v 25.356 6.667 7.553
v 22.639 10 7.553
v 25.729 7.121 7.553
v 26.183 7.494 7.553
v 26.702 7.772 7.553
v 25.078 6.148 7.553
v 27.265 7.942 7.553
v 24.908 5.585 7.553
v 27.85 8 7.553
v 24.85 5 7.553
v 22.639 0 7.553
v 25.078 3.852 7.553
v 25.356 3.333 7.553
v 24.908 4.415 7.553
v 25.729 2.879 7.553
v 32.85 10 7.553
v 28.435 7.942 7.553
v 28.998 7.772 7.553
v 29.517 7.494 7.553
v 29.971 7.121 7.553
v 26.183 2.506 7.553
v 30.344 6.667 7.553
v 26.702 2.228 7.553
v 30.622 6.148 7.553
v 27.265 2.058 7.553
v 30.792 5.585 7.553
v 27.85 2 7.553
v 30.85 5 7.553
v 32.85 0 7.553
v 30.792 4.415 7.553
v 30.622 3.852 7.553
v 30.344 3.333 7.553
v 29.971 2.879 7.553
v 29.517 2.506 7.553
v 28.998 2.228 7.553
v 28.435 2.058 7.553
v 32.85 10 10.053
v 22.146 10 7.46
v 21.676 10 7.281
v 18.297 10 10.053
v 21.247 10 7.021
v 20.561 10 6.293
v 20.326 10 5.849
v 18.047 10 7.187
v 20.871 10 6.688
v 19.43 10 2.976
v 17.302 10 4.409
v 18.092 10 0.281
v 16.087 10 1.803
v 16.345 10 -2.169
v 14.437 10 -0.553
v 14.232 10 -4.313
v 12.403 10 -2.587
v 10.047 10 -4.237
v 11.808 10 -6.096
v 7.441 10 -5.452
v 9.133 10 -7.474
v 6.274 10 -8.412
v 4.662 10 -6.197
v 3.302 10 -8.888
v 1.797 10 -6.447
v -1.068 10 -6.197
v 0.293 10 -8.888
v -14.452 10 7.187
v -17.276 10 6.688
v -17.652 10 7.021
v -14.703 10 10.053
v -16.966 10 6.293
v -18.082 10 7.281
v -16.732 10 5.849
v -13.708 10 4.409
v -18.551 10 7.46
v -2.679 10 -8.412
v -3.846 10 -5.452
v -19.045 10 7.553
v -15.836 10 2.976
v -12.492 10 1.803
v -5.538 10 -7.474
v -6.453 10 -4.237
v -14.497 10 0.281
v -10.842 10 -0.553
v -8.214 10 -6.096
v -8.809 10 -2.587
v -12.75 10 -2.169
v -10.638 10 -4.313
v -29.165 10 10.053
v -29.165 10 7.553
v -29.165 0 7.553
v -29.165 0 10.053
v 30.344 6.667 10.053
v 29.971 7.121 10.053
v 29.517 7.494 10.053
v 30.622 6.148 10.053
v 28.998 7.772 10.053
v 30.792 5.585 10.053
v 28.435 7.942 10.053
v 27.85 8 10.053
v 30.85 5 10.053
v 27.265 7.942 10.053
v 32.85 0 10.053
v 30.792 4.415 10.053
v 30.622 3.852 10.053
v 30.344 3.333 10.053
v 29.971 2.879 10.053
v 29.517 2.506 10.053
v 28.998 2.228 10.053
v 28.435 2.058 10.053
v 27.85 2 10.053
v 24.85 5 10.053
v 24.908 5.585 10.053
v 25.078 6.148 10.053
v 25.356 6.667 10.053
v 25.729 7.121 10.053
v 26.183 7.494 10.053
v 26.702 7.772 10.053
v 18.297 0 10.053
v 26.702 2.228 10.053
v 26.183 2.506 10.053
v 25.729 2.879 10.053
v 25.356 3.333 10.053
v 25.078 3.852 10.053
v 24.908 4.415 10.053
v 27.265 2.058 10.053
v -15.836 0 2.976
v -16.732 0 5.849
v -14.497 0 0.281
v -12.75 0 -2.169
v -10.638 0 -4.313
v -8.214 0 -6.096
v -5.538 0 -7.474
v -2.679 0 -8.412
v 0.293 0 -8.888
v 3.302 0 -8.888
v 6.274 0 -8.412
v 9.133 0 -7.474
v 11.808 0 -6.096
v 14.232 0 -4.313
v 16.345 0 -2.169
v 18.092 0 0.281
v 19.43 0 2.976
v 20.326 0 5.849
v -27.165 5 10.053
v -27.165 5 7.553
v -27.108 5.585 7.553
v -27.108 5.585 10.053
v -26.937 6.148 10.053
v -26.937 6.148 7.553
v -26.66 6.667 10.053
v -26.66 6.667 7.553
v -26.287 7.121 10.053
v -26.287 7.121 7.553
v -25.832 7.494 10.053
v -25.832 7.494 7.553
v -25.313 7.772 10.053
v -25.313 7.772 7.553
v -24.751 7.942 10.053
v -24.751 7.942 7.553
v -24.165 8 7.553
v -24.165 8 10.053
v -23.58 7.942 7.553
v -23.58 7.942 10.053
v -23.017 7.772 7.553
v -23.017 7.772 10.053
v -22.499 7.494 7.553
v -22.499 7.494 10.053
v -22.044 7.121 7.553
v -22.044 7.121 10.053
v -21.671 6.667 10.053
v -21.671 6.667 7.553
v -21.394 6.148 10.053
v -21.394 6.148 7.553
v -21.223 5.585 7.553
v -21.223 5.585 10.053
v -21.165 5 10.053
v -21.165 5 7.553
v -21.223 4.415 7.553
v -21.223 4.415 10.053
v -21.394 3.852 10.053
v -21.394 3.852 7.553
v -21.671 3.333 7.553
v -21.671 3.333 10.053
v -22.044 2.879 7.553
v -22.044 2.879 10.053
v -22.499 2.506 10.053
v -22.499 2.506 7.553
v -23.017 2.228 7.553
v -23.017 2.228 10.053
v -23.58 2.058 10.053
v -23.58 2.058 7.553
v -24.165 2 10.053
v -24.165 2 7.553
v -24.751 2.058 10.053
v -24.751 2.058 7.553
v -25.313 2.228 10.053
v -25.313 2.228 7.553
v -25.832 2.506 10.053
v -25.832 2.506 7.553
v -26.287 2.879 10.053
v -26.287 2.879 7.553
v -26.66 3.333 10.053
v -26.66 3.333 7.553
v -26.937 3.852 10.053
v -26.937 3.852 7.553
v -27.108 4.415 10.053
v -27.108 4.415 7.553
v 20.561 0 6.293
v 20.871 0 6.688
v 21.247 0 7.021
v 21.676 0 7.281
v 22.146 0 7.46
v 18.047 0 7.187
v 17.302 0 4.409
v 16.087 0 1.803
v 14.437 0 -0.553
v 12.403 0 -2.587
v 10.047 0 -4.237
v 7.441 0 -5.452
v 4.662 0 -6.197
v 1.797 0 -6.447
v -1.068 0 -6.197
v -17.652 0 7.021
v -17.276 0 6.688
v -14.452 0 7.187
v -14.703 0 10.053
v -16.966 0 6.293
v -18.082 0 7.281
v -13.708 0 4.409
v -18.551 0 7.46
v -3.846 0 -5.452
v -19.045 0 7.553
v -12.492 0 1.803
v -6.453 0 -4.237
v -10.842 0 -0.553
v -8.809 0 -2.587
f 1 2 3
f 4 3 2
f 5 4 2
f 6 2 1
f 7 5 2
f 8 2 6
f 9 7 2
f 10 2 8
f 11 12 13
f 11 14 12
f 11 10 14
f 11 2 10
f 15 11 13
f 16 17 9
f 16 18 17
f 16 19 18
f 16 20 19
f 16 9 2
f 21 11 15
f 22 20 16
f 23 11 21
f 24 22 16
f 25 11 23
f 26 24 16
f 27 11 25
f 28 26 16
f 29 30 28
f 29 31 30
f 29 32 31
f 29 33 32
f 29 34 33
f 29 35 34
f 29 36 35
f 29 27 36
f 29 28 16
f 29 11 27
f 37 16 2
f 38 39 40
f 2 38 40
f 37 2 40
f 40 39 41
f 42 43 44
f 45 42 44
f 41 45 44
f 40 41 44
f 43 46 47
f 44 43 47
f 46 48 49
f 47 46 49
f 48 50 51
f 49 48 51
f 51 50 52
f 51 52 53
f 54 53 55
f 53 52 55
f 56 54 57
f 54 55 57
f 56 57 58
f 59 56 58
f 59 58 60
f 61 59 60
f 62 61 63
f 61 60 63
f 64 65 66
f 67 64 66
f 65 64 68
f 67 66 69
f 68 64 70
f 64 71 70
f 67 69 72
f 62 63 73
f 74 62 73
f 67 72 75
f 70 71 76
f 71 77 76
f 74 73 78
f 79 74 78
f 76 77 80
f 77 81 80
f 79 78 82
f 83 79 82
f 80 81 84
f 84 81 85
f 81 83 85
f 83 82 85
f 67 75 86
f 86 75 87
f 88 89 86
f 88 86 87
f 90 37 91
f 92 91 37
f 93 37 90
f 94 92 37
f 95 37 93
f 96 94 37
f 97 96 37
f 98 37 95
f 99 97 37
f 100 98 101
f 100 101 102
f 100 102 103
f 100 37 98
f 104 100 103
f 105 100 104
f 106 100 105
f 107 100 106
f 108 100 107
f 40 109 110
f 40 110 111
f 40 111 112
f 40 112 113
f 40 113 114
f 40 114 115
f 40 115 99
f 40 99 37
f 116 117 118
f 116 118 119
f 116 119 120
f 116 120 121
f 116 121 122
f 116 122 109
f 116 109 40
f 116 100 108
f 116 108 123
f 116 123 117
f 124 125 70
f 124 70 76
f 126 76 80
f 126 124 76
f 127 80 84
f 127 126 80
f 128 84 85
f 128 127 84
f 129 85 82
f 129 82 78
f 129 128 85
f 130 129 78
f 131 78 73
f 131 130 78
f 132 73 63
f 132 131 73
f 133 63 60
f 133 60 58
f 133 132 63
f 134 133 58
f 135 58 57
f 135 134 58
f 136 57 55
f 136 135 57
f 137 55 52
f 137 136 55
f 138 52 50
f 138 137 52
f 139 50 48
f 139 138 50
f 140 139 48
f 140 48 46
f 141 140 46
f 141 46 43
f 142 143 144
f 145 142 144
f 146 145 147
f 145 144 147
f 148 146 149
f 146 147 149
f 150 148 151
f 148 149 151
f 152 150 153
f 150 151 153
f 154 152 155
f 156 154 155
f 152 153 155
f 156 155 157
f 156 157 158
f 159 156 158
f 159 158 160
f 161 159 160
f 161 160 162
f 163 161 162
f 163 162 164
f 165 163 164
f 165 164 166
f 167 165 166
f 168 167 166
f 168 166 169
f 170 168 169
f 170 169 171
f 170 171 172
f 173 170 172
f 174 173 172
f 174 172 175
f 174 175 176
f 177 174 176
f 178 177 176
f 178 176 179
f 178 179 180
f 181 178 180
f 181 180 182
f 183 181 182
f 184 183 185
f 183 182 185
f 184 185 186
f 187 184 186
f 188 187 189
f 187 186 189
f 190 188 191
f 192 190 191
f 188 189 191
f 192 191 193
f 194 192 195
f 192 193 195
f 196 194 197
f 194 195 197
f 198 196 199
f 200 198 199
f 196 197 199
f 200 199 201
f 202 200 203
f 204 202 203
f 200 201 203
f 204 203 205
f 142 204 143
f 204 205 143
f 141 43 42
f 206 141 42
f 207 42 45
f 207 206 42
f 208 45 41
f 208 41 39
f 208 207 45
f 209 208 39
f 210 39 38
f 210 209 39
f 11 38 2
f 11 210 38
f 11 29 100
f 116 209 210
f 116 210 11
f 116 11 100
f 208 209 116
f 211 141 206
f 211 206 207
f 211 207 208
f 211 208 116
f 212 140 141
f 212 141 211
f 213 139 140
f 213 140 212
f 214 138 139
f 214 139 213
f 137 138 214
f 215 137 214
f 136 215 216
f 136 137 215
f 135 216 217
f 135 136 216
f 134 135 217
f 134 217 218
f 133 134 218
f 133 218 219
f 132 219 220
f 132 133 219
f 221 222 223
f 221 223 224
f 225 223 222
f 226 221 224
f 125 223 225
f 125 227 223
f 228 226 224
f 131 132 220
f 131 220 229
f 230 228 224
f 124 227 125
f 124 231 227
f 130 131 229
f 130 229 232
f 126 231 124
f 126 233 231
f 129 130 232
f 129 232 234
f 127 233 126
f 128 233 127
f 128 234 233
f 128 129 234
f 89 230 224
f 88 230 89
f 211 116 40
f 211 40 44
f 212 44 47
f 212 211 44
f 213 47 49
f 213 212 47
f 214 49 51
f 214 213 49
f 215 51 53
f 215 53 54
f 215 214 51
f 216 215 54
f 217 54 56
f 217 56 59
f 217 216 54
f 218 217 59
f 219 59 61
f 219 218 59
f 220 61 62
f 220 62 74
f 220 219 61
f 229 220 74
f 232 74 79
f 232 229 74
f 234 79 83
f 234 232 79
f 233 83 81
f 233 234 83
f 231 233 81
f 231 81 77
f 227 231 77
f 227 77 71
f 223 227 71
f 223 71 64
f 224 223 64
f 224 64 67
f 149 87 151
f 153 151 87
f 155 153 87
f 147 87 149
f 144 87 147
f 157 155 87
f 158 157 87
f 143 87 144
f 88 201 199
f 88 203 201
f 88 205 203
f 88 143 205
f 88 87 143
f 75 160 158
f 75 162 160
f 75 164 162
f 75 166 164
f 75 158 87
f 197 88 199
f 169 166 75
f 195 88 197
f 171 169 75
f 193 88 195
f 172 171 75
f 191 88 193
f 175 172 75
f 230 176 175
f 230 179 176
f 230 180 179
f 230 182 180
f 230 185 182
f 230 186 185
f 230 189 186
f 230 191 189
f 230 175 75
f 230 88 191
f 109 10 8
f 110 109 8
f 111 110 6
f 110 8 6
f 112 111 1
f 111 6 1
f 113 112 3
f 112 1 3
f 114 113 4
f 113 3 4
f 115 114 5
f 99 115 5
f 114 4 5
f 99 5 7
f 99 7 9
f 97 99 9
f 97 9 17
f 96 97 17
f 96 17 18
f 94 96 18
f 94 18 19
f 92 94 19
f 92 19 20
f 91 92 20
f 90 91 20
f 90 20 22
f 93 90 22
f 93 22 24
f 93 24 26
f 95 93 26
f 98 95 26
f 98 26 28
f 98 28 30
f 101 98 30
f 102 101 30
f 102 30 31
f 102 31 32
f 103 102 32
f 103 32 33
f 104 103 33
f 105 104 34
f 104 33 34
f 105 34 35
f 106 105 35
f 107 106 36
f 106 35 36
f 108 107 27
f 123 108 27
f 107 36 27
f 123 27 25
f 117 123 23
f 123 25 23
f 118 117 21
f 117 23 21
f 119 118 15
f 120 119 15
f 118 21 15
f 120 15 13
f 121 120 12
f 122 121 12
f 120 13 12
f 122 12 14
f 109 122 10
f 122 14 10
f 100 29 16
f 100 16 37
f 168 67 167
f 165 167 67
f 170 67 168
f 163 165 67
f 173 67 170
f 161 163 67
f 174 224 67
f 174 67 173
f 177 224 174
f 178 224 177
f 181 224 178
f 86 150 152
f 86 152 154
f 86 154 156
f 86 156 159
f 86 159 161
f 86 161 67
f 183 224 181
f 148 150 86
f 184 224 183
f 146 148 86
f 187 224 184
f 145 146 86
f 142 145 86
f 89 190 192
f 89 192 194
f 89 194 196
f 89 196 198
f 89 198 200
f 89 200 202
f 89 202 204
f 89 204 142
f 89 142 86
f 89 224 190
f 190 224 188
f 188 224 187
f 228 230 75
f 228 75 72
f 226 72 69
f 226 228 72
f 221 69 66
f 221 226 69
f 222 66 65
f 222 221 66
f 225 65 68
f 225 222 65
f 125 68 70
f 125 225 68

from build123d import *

# Parameters (mm, degrees)
BOSS_EXTRUDE1_DEPTH = 10
SKETCH2_R           = 3
CUT_EXTRUDE1_DEPTH  = 8


with BuildPart() as part:
    # Sketch1 → Boss-Extrude1 (new body)
    with BuildSketch(Plane(origin=(0, 0, 0), x_dir=(1, 0, 0), z_dir=(0, 1, 0))):
        with BuildLine():
            Line((-14.70271565, -10.052675371), (-29.165444207, -10.052675371))
            Line((-29.165444207, -10.052675371), (-29.165444207, -7.552675371))
            Line((-29.165444207, -7.552675371), (-19.04460375, -7.552675371))
            ThreePointArc((-19.04460375, -7.552675371), (-17.652378747, -7.021091902), (-16.731881464, -5.849103764))
            ThreePointArc((-16.731881464, -5.849103764), (1.79728435, 8.947324629), (20.326450163, -5.849103764))
            ThreePointArc((20.326450163, -5.849103764), (21.246947447, -7.021091902), (22.63917245, -7.552675371))
            Line((22.63917245, -7.552675371), (32.849946683, -7.552675371))
            Line((32.849946683, -7.552675371), (32.849946683, -10.052675371))
            Line((32.849946683, -10.052675371), (18.29728435, -10.052675371))
            ThreePointArc((18.29728435, -10.052675371), (1.79728435, 6.447324629), (-14.70271565, -10.052675371))
        make_face()
    extrude(amount=BOSS_EXTRUDE1_DEPTH)

    # Sketch2 → Cut-Extrude1 (cut)
    with BuildSketch(Plane(origin=(0, 0, 7.552675371), x_dir=(-1, 0, 0), z_dir=(0, 0, -1))):
        with Locations((24.165444207, 5)):
            Circle(SKETCH2_R)
        with Locations((-27.849946683, 5)):
            Circle(SKETCH2_R)
    extrude(amount=-CUT_EXTRUDE1_DEPTH, mode=Mode.SUBTRACT)


solid = part.part
